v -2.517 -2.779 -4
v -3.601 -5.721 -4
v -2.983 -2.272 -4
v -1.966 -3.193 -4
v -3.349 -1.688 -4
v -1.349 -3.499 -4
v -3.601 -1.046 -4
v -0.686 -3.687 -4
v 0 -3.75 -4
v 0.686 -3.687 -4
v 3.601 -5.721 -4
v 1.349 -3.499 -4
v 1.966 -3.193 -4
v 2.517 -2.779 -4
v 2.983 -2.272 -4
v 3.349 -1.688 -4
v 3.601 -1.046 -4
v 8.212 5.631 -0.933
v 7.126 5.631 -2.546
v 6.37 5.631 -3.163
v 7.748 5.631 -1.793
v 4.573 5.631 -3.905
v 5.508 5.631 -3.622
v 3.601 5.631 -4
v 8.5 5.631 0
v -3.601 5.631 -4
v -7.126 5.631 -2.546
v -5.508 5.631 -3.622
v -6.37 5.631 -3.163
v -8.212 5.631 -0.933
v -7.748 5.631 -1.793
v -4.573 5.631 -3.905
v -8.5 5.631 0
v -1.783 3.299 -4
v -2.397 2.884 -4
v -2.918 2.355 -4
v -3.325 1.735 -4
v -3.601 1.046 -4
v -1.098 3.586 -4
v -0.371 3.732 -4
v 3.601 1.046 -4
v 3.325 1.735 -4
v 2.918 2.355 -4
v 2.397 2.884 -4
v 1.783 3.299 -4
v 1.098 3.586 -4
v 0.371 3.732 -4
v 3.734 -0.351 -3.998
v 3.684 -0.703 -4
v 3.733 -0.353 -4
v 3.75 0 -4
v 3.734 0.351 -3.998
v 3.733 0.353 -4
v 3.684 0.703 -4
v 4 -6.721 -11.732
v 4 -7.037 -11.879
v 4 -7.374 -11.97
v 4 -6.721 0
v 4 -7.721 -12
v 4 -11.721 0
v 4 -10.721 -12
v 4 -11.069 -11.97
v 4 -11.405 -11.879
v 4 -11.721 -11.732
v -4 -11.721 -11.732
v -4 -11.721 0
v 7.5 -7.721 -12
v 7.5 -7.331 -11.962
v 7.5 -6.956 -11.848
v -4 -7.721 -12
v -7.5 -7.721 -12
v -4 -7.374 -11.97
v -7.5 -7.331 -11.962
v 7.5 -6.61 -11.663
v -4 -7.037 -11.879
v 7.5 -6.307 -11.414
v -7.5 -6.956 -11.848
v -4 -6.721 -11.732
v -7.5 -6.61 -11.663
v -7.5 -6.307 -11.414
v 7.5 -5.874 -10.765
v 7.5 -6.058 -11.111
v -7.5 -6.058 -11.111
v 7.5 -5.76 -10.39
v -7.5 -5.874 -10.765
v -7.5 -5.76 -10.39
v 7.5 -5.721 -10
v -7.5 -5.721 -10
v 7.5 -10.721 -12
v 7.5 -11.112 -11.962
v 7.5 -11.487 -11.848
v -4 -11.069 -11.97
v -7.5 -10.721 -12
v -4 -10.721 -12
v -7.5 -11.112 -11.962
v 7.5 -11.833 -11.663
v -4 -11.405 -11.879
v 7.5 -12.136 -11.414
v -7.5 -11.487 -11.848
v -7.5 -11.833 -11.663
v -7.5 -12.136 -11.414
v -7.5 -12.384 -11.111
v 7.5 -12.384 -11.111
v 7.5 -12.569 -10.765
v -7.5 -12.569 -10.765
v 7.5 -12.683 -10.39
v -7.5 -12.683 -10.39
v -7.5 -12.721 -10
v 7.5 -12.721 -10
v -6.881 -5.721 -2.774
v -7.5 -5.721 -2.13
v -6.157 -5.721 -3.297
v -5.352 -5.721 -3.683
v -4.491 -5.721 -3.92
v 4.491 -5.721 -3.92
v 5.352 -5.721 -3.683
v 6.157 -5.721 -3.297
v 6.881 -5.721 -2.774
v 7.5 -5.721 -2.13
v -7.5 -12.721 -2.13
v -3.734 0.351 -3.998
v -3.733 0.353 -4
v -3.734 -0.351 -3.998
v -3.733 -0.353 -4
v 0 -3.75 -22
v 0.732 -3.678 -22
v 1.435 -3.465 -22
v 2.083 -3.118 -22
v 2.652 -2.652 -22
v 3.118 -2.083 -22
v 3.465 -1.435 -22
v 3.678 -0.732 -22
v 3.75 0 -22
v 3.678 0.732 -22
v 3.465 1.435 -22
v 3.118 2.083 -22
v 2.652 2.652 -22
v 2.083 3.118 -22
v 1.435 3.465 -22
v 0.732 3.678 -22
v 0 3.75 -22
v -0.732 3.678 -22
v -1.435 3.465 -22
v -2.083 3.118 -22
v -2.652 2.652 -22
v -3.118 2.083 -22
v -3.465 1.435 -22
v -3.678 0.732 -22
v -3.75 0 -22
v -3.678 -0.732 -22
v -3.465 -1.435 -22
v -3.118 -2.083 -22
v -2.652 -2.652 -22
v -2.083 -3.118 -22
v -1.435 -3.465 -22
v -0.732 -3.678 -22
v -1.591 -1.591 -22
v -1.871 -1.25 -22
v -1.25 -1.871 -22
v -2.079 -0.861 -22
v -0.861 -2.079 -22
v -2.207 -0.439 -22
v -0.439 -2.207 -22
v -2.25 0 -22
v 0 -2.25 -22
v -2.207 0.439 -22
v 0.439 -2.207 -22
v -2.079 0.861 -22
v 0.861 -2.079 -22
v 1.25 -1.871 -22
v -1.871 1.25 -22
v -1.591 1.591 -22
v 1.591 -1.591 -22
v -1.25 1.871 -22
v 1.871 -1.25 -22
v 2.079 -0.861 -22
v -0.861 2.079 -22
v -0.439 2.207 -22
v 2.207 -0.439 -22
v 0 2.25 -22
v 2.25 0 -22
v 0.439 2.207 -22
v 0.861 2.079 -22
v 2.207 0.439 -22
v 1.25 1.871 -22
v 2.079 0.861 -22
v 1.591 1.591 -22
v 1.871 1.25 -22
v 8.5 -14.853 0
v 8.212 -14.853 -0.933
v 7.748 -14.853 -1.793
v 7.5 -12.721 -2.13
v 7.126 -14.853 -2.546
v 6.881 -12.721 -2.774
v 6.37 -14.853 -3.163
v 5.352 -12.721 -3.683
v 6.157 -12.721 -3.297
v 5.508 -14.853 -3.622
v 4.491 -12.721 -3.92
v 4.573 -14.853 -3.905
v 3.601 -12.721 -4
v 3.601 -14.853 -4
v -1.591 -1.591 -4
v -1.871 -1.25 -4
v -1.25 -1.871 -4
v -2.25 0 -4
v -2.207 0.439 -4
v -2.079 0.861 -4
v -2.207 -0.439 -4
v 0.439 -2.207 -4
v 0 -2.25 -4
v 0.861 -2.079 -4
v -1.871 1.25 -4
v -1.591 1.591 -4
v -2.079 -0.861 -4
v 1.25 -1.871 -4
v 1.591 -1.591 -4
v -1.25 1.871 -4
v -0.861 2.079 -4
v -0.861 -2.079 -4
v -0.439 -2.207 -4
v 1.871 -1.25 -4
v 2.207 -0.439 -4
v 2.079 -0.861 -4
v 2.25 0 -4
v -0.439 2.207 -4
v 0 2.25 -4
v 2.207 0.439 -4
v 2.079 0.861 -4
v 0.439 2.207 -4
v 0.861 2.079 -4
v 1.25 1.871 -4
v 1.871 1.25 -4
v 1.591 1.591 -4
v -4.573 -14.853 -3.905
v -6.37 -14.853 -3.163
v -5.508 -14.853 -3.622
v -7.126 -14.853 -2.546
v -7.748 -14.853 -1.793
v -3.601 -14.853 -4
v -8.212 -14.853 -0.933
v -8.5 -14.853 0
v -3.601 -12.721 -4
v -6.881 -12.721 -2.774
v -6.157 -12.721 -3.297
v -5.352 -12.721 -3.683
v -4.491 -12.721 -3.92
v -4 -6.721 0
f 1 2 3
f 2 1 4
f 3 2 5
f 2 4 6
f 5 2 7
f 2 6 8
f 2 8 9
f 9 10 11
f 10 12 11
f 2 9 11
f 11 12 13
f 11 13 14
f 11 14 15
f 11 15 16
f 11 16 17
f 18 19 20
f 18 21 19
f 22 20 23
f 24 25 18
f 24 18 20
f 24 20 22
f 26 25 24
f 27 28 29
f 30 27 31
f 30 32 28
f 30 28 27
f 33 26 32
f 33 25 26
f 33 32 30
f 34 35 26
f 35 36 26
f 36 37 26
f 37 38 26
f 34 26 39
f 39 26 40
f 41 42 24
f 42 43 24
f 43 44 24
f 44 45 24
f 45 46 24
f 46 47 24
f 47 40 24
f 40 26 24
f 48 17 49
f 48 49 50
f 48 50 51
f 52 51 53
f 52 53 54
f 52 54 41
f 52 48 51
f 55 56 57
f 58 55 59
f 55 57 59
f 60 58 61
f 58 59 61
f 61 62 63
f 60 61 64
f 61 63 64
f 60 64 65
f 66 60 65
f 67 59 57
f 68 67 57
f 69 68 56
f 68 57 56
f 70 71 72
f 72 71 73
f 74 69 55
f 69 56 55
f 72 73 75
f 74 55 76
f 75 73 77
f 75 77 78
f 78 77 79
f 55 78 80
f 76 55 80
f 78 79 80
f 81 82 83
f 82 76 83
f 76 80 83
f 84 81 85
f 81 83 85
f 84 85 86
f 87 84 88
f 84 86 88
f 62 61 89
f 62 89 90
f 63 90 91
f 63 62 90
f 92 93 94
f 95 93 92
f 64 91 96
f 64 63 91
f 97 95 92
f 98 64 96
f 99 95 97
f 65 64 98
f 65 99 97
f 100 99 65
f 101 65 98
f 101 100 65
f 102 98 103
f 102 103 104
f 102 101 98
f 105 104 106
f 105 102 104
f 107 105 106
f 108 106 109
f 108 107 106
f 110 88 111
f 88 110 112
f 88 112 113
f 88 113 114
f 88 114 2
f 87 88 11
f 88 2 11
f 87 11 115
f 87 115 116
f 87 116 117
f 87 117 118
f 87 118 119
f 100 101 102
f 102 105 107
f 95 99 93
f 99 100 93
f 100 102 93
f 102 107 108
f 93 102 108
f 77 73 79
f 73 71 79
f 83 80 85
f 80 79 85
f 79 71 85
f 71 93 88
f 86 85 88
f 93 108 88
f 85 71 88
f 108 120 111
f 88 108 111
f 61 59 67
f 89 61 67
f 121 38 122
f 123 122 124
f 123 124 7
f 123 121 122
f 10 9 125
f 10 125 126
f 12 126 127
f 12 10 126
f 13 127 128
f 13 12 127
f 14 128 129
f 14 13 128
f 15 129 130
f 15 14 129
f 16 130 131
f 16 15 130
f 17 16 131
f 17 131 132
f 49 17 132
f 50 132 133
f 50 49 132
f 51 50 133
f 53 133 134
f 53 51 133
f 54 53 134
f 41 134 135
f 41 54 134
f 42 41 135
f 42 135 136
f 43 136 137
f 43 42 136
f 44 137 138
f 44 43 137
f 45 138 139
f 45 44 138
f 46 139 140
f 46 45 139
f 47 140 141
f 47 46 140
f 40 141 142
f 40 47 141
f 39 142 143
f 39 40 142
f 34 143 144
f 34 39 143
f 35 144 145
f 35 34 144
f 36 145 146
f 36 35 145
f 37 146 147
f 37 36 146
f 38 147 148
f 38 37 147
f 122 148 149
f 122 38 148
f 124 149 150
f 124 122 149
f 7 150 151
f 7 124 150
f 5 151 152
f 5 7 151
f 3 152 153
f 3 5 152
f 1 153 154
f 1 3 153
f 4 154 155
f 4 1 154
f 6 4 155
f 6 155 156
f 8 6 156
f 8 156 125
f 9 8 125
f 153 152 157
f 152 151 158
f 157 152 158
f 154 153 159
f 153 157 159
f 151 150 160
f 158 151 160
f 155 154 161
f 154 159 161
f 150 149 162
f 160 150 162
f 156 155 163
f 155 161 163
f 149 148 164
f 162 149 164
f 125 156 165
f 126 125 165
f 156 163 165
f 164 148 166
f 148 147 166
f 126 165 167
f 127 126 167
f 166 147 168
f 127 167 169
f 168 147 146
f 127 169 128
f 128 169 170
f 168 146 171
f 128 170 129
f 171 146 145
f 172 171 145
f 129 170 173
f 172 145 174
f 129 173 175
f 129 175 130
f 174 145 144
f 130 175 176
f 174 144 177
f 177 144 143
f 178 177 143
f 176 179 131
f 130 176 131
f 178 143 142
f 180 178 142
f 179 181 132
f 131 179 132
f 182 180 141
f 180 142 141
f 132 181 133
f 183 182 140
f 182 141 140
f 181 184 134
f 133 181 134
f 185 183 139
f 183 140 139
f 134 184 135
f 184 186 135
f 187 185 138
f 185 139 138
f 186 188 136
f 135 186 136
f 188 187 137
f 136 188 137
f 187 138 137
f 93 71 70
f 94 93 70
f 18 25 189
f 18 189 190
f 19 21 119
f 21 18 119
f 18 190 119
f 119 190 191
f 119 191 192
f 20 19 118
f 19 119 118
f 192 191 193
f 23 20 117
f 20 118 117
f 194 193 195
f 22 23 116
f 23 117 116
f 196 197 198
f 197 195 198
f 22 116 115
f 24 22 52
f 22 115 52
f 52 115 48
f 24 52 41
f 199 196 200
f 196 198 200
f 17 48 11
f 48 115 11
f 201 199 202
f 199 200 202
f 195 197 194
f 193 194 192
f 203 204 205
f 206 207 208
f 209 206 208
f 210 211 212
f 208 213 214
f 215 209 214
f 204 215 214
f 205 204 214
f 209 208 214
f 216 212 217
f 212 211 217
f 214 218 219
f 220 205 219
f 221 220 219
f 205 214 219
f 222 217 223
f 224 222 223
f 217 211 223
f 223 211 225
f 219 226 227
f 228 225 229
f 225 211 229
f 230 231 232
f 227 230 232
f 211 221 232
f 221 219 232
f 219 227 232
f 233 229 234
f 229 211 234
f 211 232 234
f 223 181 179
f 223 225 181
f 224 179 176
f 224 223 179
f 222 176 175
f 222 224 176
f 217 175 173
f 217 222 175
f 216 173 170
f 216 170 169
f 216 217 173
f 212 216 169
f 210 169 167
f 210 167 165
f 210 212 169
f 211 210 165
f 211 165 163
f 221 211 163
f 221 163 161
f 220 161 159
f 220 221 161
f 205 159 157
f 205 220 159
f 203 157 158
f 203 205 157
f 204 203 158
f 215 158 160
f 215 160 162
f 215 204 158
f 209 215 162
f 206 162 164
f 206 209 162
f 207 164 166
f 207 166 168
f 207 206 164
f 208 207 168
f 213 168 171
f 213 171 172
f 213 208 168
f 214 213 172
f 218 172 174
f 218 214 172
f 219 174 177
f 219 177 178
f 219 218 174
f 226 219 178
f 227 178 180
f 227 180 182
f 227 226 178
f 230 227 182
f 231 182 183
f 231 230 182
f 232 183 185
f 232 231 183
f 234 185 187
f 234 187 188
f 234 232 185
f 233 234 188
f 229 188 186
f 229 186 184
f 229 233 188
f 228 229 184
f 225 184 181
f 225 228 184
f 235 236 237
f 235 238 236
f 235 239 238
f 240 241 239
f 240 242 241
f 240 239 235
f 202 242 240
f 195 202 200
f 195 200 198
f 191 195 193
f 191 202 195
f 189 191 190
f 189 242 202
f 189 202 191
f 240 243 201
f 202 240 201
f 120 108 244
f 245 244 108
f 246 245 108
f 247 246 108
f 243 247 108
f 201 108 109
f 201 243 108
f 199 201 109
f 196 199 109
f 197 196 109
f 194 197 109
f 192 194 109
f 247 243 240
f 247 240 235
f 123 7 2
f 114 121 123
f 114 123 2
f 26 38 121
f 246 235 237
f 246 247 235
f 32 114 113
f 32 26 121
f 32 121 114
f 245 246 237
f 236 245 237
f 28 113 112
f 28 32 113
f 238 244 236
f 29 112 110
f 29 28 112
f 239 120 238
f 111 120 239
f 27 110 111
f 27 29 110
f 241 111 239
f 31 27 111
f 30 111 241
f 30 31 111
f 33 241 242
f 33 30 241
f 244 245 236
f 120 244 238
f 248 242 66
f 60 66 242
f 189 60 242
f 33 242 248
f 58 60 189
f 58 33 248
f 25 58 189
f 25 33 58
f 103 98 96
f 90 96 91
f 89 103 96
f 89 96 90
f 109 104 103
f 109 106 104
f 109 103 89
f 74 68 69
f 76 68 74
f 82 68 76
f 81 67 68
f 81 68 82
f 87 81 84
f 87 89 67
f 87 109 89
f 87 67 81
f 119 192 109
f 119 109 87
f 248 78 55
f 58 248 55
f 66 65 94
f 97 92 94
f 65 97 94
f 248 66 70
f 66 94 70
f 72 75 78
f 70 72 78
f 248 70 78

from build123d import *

# Parameters (mm, degrees)
F1_W         = 8.5
F1_H         = 20.4836754128
F2_DEPTH     = 4
F3_DEPTH     = 12
F4_DEPTH     = 4
F5_DEPTH     = 10
F6_T1_DEPTH  = 25
F7_T4_DEPTH  = 44.9785728407
F7_S6_R      = 3.75
F7_T7_DEPTH  = 24
F7_T11_DEPTH = 44.9785728407
F7_T16_DEPTH = 44.9785728407
F7_T21_DEPTH = 44.9785728407
F7_T26_DEPTH = 44.9785728407
F7_T31_DEPTH = 44.9785728407
F7_S33_R     = 3.75
F7_T34_DEPTH = 24


# Not quite as in the source:
# - a fillet or chamfer that OpenCascade refuses, or shapes differently, is made with other operations: its cross-section is extruded or revolved along the edge and cut away or added


with BuildPart() as f2:
    # F1 (on Top) → F2 (new body)
    with BuildSketch(Plane.XY):
        with Locations((4.25, -4.6106860973)):
            Rectangle(F1_W, F1_H)
        with Locations((-4.25, -4.6106860973)):
            Rectangle(F1_W, F1_H)
    extrude(amount=-F2_DEPTH)

    # F0 (on Top) → F3 (join)
    with BuildSketch(Plane.XY):
        with BuildLine():
            ThreePointArc((3.75, 0), (-2.6516504294, 2.6516504294), (0, -3.75))
            ThreePointArc((0, -3.75), (2.6516504294, -2.6516504294), (3.75, 0))
        make_face()
        with BuildLine():
            ThreePointArc((0, -2.25), (-1.5909902577, 1.5909902577), (2.25, 0))
            ThreePointArc((2.25, 0), (1.5909902577, -1.5909902577), (0, -2.25))
        make_face(mode=Mode.SUBTRACT)
        Polygon((7.5, -5.7213721946), (0, -5.7213721946), (-7.5, -5.7213721946), (-7.5, -12.7213721946), (7.5, -12.7213721946), align=None)
        Polygon((-4, -6.7213721946), (0, -6.7213721946), (4, -6.7213721946), (4, -11.7213721946), (-4, -11.7213721946), align=None, mode=Mode.SUBTRACT)
    extrude(amount=-F3_DEPTH)

    # F4 (cut): a face of the model
    f4_faces = [f2.faces().sort_by_distance(p)[0] for p in [
        (0, -9.2213721946, -4),
    ]]
    extrude(f4_faces, amount=-F4_DEPTH, mode=Mode.SUBTRACT)

    # F5 (add): a face of the model
    f5_faces = [f2.faces().sort_by_distance(p)[0] for p in [
        (0, 3.6439339828, -12),
    ]]
    extrude(f5_faces, amount=F5_DEPTH)

    # F6: fillet of radius 2 on 2 edges, made by hand

    # F6_s2 → F6_t1 (cut)
    with BuildSketch(Plane.YZ.offset(-12.5)):
        with BuildLine():
            ThreePointArc((-10.7213721946, -12), (-12.135585757, -11.4142135624), (-12.7213721946, -10))
            Line((-12.7213721946, -10), (-12.7213721946, -12))
            Line((-12.7213721946, -12), (-10.7213721946, -12))
        make_face()
        with BuildLine():
            ThreePointArc((-7.7213721946, -12), (-6.3071586322, -11.4142135624), (-5.7213721946, -10))
            Line((-5.7213721946, -10), (-5.7213721946, -12))
            Line((-5.7213721946, -12), (-7.7213721946, -12))
        make_face()
    extrude(amount=F6_T1_DEPTH, mode=Mode.SUBTRACT)

    # F7: fillet of radius 5 on 2 edges, made by hand


with BuildPart() as f7_tool2:
    # F7_s3 → F7_t4 (new body)
    with BuildSketch(Plane.XZ.offset(-17.8786003231)):
        with BuildLine():
            ThreePointArc((-3.6010205144, -4), (-6.7632981746, -2.8729833462), (-8.5, 0))
            Line((-8.5, 0), (-8.5, -4))
            Line((-8.5, -4), (-3.6010205144, -4))
        make_face()
    extrude(amount=F7_T4_DEPTH)

    split(bisect_by=Plane.XZ.offset(5.7213721946), keep=Keep.BOTTOM)

    # F7_s6 → F7_t7 (cut, symmetric)
    with BuildSketch(Plane.XY.offset(-2)):
        Circle(F7_S6_R)
    extrude(amount=F7_T7_DEPTH, both=True, mode=Mode.SUBTRACT)


with BuildPart() as f2_1:
    add(f2.part)

    # F7_t1: cut F7_tool2
    add(f7_tool2.part, mode=Mode.SUBTRACT)


with BuildPart() as f7_tool9:
    # F7_s10 → F7_t11 (new body)
    with BuildSketch(Plane.XZ.offset(-17.8786003231)):
        with BuildLine():
            ThreePointArc((-3.6010205144, -4), (-6.7632981746, -2.8729833462), (-8.5, 0))
            Line((-8.5, 0), (-8.5, -4))
            Line((-8.5, -4), (-3.6010205144, -4))
        make_face()
    extrude(amount=F7_T11_DEPTH)

    split(bisect_by=Plane.YZ.offset(-7.5), keep=Keep.BOTTOM)


with BuildPart() as f2_2:
    add(f2_1.part)

    # F7_t8: cut F7_tool9
    add(f7_tool9.part, mode=Mode.SUBTRACT)


with BuildPart() as f7_tool14:
    # F7_s15 → F7_t16 (new body)
    with BuildSketch(Plane.XZ.offset(-17.8786003231)):
        with BuildLine():
            ThreePointArc((-3.6010205144, -4), (-6.7632981746, -2.8729833462), (-8.5, 0))
            Line((-8.5, 0), (-8.5, -4))
            Line((-8.5, -4), (-3.6010205144, -4))
        make_face()
    extrude(amount=F7_T16_DEPTH)

    split(bisect_by=Plane.XZ.offset(12.7213721946), keep=Keep.TOP)


with BuildPart() as f2_3:
    add(f2_2.part)

    # F7_t13: cut F7_tool14
    add(f7_tool14.part, mode=Mode.SUBTRACT)


with BuildPart() as f7_tool19:
    # F7_s20 → F7_t21 (new body)
    with BuildSketch(Plane.XZ.offset(27.0999725176)):
        with BuildLine():
            ThreePointArc((8.5, 0), (6.7632981746, -2.8729833462), (3.6010205144, -4))
            Line((3.6010205144, -4), (8.5, -4))
            Line((8.5, -4), (8.5, 0))
        make_face()
    extrude(amount=-F7_T21_DEPTH)

    split(bisect_by=Plane.YZ.offset(7.5), keep=Keep.TOP)


with BuildPart() as f2_4:
    add(f2_3.part)

    # F7_t18: cut F7_tool19
    add(f7_tool19.part, mode=Mode.SUBTRACT)


with BuildPart() as f7_tool24:
    # F7_s25 → F7_t26 (new body)
    with BuildSketch(Plane.XZ.offset(27.0999725176)):
        with BuildLine():
            ThreePointArc((8.5, 0), (6.7632981746, -2.8729833462), (3.6010205144, -4))
            Line((3.6010205144, -4), (8.5, -4))
            Line((8.5, -4), (8.5, 0))
        make_face()
    extrude(amount=-F7_T26_DEPTH)

    split(bisect_by=Plane.XZ.offset(12.7213721946), keep=Keep.TOP)


with BuildPart() as f2_5:
    add(f2_4.part)

    # F7_t23: cut F7_tool24
    add(f7_tool24.part, mode=Mode.SUBTRACT)


with BuildPart() as f7_tool29:
    # F7_s30 → F7_t31 (new body)
    with BuildSketch(Plane.XZ.offset(27.0999725176)):
        with BuildLine():
            ThreePointArc((8.5, 0), (6.7632981746, -2.8729833462), (3.6010205144, -4))
            Line((3.6010205144, -4), (8.5, -4))
            Line((8.5, -4), (8.5, 0))
        make_face()
    extrude(amount=-F7_T31_DEPTH)

    split(bisect_by=Plane.XZ.offset(5.7213721946), keep=Keep.BOTTOM)

    # F7_s33 → F7_t34 (cut, symmetric)
    with BuildSketch(Plane.XY.offset(-2)):
        Circle(F7_S33_R)
    extrude(amount=F7_T34_DEPTH, both=True, mode=Mode.SUBTRACT)


with BuildPart() as f2_6:
    add(f2_5.part)

    # F7_t28: cut F7_tool29
    add(f7_tool29.part, mode=Mode.SUBTRACT)


solid = f2_6.part
